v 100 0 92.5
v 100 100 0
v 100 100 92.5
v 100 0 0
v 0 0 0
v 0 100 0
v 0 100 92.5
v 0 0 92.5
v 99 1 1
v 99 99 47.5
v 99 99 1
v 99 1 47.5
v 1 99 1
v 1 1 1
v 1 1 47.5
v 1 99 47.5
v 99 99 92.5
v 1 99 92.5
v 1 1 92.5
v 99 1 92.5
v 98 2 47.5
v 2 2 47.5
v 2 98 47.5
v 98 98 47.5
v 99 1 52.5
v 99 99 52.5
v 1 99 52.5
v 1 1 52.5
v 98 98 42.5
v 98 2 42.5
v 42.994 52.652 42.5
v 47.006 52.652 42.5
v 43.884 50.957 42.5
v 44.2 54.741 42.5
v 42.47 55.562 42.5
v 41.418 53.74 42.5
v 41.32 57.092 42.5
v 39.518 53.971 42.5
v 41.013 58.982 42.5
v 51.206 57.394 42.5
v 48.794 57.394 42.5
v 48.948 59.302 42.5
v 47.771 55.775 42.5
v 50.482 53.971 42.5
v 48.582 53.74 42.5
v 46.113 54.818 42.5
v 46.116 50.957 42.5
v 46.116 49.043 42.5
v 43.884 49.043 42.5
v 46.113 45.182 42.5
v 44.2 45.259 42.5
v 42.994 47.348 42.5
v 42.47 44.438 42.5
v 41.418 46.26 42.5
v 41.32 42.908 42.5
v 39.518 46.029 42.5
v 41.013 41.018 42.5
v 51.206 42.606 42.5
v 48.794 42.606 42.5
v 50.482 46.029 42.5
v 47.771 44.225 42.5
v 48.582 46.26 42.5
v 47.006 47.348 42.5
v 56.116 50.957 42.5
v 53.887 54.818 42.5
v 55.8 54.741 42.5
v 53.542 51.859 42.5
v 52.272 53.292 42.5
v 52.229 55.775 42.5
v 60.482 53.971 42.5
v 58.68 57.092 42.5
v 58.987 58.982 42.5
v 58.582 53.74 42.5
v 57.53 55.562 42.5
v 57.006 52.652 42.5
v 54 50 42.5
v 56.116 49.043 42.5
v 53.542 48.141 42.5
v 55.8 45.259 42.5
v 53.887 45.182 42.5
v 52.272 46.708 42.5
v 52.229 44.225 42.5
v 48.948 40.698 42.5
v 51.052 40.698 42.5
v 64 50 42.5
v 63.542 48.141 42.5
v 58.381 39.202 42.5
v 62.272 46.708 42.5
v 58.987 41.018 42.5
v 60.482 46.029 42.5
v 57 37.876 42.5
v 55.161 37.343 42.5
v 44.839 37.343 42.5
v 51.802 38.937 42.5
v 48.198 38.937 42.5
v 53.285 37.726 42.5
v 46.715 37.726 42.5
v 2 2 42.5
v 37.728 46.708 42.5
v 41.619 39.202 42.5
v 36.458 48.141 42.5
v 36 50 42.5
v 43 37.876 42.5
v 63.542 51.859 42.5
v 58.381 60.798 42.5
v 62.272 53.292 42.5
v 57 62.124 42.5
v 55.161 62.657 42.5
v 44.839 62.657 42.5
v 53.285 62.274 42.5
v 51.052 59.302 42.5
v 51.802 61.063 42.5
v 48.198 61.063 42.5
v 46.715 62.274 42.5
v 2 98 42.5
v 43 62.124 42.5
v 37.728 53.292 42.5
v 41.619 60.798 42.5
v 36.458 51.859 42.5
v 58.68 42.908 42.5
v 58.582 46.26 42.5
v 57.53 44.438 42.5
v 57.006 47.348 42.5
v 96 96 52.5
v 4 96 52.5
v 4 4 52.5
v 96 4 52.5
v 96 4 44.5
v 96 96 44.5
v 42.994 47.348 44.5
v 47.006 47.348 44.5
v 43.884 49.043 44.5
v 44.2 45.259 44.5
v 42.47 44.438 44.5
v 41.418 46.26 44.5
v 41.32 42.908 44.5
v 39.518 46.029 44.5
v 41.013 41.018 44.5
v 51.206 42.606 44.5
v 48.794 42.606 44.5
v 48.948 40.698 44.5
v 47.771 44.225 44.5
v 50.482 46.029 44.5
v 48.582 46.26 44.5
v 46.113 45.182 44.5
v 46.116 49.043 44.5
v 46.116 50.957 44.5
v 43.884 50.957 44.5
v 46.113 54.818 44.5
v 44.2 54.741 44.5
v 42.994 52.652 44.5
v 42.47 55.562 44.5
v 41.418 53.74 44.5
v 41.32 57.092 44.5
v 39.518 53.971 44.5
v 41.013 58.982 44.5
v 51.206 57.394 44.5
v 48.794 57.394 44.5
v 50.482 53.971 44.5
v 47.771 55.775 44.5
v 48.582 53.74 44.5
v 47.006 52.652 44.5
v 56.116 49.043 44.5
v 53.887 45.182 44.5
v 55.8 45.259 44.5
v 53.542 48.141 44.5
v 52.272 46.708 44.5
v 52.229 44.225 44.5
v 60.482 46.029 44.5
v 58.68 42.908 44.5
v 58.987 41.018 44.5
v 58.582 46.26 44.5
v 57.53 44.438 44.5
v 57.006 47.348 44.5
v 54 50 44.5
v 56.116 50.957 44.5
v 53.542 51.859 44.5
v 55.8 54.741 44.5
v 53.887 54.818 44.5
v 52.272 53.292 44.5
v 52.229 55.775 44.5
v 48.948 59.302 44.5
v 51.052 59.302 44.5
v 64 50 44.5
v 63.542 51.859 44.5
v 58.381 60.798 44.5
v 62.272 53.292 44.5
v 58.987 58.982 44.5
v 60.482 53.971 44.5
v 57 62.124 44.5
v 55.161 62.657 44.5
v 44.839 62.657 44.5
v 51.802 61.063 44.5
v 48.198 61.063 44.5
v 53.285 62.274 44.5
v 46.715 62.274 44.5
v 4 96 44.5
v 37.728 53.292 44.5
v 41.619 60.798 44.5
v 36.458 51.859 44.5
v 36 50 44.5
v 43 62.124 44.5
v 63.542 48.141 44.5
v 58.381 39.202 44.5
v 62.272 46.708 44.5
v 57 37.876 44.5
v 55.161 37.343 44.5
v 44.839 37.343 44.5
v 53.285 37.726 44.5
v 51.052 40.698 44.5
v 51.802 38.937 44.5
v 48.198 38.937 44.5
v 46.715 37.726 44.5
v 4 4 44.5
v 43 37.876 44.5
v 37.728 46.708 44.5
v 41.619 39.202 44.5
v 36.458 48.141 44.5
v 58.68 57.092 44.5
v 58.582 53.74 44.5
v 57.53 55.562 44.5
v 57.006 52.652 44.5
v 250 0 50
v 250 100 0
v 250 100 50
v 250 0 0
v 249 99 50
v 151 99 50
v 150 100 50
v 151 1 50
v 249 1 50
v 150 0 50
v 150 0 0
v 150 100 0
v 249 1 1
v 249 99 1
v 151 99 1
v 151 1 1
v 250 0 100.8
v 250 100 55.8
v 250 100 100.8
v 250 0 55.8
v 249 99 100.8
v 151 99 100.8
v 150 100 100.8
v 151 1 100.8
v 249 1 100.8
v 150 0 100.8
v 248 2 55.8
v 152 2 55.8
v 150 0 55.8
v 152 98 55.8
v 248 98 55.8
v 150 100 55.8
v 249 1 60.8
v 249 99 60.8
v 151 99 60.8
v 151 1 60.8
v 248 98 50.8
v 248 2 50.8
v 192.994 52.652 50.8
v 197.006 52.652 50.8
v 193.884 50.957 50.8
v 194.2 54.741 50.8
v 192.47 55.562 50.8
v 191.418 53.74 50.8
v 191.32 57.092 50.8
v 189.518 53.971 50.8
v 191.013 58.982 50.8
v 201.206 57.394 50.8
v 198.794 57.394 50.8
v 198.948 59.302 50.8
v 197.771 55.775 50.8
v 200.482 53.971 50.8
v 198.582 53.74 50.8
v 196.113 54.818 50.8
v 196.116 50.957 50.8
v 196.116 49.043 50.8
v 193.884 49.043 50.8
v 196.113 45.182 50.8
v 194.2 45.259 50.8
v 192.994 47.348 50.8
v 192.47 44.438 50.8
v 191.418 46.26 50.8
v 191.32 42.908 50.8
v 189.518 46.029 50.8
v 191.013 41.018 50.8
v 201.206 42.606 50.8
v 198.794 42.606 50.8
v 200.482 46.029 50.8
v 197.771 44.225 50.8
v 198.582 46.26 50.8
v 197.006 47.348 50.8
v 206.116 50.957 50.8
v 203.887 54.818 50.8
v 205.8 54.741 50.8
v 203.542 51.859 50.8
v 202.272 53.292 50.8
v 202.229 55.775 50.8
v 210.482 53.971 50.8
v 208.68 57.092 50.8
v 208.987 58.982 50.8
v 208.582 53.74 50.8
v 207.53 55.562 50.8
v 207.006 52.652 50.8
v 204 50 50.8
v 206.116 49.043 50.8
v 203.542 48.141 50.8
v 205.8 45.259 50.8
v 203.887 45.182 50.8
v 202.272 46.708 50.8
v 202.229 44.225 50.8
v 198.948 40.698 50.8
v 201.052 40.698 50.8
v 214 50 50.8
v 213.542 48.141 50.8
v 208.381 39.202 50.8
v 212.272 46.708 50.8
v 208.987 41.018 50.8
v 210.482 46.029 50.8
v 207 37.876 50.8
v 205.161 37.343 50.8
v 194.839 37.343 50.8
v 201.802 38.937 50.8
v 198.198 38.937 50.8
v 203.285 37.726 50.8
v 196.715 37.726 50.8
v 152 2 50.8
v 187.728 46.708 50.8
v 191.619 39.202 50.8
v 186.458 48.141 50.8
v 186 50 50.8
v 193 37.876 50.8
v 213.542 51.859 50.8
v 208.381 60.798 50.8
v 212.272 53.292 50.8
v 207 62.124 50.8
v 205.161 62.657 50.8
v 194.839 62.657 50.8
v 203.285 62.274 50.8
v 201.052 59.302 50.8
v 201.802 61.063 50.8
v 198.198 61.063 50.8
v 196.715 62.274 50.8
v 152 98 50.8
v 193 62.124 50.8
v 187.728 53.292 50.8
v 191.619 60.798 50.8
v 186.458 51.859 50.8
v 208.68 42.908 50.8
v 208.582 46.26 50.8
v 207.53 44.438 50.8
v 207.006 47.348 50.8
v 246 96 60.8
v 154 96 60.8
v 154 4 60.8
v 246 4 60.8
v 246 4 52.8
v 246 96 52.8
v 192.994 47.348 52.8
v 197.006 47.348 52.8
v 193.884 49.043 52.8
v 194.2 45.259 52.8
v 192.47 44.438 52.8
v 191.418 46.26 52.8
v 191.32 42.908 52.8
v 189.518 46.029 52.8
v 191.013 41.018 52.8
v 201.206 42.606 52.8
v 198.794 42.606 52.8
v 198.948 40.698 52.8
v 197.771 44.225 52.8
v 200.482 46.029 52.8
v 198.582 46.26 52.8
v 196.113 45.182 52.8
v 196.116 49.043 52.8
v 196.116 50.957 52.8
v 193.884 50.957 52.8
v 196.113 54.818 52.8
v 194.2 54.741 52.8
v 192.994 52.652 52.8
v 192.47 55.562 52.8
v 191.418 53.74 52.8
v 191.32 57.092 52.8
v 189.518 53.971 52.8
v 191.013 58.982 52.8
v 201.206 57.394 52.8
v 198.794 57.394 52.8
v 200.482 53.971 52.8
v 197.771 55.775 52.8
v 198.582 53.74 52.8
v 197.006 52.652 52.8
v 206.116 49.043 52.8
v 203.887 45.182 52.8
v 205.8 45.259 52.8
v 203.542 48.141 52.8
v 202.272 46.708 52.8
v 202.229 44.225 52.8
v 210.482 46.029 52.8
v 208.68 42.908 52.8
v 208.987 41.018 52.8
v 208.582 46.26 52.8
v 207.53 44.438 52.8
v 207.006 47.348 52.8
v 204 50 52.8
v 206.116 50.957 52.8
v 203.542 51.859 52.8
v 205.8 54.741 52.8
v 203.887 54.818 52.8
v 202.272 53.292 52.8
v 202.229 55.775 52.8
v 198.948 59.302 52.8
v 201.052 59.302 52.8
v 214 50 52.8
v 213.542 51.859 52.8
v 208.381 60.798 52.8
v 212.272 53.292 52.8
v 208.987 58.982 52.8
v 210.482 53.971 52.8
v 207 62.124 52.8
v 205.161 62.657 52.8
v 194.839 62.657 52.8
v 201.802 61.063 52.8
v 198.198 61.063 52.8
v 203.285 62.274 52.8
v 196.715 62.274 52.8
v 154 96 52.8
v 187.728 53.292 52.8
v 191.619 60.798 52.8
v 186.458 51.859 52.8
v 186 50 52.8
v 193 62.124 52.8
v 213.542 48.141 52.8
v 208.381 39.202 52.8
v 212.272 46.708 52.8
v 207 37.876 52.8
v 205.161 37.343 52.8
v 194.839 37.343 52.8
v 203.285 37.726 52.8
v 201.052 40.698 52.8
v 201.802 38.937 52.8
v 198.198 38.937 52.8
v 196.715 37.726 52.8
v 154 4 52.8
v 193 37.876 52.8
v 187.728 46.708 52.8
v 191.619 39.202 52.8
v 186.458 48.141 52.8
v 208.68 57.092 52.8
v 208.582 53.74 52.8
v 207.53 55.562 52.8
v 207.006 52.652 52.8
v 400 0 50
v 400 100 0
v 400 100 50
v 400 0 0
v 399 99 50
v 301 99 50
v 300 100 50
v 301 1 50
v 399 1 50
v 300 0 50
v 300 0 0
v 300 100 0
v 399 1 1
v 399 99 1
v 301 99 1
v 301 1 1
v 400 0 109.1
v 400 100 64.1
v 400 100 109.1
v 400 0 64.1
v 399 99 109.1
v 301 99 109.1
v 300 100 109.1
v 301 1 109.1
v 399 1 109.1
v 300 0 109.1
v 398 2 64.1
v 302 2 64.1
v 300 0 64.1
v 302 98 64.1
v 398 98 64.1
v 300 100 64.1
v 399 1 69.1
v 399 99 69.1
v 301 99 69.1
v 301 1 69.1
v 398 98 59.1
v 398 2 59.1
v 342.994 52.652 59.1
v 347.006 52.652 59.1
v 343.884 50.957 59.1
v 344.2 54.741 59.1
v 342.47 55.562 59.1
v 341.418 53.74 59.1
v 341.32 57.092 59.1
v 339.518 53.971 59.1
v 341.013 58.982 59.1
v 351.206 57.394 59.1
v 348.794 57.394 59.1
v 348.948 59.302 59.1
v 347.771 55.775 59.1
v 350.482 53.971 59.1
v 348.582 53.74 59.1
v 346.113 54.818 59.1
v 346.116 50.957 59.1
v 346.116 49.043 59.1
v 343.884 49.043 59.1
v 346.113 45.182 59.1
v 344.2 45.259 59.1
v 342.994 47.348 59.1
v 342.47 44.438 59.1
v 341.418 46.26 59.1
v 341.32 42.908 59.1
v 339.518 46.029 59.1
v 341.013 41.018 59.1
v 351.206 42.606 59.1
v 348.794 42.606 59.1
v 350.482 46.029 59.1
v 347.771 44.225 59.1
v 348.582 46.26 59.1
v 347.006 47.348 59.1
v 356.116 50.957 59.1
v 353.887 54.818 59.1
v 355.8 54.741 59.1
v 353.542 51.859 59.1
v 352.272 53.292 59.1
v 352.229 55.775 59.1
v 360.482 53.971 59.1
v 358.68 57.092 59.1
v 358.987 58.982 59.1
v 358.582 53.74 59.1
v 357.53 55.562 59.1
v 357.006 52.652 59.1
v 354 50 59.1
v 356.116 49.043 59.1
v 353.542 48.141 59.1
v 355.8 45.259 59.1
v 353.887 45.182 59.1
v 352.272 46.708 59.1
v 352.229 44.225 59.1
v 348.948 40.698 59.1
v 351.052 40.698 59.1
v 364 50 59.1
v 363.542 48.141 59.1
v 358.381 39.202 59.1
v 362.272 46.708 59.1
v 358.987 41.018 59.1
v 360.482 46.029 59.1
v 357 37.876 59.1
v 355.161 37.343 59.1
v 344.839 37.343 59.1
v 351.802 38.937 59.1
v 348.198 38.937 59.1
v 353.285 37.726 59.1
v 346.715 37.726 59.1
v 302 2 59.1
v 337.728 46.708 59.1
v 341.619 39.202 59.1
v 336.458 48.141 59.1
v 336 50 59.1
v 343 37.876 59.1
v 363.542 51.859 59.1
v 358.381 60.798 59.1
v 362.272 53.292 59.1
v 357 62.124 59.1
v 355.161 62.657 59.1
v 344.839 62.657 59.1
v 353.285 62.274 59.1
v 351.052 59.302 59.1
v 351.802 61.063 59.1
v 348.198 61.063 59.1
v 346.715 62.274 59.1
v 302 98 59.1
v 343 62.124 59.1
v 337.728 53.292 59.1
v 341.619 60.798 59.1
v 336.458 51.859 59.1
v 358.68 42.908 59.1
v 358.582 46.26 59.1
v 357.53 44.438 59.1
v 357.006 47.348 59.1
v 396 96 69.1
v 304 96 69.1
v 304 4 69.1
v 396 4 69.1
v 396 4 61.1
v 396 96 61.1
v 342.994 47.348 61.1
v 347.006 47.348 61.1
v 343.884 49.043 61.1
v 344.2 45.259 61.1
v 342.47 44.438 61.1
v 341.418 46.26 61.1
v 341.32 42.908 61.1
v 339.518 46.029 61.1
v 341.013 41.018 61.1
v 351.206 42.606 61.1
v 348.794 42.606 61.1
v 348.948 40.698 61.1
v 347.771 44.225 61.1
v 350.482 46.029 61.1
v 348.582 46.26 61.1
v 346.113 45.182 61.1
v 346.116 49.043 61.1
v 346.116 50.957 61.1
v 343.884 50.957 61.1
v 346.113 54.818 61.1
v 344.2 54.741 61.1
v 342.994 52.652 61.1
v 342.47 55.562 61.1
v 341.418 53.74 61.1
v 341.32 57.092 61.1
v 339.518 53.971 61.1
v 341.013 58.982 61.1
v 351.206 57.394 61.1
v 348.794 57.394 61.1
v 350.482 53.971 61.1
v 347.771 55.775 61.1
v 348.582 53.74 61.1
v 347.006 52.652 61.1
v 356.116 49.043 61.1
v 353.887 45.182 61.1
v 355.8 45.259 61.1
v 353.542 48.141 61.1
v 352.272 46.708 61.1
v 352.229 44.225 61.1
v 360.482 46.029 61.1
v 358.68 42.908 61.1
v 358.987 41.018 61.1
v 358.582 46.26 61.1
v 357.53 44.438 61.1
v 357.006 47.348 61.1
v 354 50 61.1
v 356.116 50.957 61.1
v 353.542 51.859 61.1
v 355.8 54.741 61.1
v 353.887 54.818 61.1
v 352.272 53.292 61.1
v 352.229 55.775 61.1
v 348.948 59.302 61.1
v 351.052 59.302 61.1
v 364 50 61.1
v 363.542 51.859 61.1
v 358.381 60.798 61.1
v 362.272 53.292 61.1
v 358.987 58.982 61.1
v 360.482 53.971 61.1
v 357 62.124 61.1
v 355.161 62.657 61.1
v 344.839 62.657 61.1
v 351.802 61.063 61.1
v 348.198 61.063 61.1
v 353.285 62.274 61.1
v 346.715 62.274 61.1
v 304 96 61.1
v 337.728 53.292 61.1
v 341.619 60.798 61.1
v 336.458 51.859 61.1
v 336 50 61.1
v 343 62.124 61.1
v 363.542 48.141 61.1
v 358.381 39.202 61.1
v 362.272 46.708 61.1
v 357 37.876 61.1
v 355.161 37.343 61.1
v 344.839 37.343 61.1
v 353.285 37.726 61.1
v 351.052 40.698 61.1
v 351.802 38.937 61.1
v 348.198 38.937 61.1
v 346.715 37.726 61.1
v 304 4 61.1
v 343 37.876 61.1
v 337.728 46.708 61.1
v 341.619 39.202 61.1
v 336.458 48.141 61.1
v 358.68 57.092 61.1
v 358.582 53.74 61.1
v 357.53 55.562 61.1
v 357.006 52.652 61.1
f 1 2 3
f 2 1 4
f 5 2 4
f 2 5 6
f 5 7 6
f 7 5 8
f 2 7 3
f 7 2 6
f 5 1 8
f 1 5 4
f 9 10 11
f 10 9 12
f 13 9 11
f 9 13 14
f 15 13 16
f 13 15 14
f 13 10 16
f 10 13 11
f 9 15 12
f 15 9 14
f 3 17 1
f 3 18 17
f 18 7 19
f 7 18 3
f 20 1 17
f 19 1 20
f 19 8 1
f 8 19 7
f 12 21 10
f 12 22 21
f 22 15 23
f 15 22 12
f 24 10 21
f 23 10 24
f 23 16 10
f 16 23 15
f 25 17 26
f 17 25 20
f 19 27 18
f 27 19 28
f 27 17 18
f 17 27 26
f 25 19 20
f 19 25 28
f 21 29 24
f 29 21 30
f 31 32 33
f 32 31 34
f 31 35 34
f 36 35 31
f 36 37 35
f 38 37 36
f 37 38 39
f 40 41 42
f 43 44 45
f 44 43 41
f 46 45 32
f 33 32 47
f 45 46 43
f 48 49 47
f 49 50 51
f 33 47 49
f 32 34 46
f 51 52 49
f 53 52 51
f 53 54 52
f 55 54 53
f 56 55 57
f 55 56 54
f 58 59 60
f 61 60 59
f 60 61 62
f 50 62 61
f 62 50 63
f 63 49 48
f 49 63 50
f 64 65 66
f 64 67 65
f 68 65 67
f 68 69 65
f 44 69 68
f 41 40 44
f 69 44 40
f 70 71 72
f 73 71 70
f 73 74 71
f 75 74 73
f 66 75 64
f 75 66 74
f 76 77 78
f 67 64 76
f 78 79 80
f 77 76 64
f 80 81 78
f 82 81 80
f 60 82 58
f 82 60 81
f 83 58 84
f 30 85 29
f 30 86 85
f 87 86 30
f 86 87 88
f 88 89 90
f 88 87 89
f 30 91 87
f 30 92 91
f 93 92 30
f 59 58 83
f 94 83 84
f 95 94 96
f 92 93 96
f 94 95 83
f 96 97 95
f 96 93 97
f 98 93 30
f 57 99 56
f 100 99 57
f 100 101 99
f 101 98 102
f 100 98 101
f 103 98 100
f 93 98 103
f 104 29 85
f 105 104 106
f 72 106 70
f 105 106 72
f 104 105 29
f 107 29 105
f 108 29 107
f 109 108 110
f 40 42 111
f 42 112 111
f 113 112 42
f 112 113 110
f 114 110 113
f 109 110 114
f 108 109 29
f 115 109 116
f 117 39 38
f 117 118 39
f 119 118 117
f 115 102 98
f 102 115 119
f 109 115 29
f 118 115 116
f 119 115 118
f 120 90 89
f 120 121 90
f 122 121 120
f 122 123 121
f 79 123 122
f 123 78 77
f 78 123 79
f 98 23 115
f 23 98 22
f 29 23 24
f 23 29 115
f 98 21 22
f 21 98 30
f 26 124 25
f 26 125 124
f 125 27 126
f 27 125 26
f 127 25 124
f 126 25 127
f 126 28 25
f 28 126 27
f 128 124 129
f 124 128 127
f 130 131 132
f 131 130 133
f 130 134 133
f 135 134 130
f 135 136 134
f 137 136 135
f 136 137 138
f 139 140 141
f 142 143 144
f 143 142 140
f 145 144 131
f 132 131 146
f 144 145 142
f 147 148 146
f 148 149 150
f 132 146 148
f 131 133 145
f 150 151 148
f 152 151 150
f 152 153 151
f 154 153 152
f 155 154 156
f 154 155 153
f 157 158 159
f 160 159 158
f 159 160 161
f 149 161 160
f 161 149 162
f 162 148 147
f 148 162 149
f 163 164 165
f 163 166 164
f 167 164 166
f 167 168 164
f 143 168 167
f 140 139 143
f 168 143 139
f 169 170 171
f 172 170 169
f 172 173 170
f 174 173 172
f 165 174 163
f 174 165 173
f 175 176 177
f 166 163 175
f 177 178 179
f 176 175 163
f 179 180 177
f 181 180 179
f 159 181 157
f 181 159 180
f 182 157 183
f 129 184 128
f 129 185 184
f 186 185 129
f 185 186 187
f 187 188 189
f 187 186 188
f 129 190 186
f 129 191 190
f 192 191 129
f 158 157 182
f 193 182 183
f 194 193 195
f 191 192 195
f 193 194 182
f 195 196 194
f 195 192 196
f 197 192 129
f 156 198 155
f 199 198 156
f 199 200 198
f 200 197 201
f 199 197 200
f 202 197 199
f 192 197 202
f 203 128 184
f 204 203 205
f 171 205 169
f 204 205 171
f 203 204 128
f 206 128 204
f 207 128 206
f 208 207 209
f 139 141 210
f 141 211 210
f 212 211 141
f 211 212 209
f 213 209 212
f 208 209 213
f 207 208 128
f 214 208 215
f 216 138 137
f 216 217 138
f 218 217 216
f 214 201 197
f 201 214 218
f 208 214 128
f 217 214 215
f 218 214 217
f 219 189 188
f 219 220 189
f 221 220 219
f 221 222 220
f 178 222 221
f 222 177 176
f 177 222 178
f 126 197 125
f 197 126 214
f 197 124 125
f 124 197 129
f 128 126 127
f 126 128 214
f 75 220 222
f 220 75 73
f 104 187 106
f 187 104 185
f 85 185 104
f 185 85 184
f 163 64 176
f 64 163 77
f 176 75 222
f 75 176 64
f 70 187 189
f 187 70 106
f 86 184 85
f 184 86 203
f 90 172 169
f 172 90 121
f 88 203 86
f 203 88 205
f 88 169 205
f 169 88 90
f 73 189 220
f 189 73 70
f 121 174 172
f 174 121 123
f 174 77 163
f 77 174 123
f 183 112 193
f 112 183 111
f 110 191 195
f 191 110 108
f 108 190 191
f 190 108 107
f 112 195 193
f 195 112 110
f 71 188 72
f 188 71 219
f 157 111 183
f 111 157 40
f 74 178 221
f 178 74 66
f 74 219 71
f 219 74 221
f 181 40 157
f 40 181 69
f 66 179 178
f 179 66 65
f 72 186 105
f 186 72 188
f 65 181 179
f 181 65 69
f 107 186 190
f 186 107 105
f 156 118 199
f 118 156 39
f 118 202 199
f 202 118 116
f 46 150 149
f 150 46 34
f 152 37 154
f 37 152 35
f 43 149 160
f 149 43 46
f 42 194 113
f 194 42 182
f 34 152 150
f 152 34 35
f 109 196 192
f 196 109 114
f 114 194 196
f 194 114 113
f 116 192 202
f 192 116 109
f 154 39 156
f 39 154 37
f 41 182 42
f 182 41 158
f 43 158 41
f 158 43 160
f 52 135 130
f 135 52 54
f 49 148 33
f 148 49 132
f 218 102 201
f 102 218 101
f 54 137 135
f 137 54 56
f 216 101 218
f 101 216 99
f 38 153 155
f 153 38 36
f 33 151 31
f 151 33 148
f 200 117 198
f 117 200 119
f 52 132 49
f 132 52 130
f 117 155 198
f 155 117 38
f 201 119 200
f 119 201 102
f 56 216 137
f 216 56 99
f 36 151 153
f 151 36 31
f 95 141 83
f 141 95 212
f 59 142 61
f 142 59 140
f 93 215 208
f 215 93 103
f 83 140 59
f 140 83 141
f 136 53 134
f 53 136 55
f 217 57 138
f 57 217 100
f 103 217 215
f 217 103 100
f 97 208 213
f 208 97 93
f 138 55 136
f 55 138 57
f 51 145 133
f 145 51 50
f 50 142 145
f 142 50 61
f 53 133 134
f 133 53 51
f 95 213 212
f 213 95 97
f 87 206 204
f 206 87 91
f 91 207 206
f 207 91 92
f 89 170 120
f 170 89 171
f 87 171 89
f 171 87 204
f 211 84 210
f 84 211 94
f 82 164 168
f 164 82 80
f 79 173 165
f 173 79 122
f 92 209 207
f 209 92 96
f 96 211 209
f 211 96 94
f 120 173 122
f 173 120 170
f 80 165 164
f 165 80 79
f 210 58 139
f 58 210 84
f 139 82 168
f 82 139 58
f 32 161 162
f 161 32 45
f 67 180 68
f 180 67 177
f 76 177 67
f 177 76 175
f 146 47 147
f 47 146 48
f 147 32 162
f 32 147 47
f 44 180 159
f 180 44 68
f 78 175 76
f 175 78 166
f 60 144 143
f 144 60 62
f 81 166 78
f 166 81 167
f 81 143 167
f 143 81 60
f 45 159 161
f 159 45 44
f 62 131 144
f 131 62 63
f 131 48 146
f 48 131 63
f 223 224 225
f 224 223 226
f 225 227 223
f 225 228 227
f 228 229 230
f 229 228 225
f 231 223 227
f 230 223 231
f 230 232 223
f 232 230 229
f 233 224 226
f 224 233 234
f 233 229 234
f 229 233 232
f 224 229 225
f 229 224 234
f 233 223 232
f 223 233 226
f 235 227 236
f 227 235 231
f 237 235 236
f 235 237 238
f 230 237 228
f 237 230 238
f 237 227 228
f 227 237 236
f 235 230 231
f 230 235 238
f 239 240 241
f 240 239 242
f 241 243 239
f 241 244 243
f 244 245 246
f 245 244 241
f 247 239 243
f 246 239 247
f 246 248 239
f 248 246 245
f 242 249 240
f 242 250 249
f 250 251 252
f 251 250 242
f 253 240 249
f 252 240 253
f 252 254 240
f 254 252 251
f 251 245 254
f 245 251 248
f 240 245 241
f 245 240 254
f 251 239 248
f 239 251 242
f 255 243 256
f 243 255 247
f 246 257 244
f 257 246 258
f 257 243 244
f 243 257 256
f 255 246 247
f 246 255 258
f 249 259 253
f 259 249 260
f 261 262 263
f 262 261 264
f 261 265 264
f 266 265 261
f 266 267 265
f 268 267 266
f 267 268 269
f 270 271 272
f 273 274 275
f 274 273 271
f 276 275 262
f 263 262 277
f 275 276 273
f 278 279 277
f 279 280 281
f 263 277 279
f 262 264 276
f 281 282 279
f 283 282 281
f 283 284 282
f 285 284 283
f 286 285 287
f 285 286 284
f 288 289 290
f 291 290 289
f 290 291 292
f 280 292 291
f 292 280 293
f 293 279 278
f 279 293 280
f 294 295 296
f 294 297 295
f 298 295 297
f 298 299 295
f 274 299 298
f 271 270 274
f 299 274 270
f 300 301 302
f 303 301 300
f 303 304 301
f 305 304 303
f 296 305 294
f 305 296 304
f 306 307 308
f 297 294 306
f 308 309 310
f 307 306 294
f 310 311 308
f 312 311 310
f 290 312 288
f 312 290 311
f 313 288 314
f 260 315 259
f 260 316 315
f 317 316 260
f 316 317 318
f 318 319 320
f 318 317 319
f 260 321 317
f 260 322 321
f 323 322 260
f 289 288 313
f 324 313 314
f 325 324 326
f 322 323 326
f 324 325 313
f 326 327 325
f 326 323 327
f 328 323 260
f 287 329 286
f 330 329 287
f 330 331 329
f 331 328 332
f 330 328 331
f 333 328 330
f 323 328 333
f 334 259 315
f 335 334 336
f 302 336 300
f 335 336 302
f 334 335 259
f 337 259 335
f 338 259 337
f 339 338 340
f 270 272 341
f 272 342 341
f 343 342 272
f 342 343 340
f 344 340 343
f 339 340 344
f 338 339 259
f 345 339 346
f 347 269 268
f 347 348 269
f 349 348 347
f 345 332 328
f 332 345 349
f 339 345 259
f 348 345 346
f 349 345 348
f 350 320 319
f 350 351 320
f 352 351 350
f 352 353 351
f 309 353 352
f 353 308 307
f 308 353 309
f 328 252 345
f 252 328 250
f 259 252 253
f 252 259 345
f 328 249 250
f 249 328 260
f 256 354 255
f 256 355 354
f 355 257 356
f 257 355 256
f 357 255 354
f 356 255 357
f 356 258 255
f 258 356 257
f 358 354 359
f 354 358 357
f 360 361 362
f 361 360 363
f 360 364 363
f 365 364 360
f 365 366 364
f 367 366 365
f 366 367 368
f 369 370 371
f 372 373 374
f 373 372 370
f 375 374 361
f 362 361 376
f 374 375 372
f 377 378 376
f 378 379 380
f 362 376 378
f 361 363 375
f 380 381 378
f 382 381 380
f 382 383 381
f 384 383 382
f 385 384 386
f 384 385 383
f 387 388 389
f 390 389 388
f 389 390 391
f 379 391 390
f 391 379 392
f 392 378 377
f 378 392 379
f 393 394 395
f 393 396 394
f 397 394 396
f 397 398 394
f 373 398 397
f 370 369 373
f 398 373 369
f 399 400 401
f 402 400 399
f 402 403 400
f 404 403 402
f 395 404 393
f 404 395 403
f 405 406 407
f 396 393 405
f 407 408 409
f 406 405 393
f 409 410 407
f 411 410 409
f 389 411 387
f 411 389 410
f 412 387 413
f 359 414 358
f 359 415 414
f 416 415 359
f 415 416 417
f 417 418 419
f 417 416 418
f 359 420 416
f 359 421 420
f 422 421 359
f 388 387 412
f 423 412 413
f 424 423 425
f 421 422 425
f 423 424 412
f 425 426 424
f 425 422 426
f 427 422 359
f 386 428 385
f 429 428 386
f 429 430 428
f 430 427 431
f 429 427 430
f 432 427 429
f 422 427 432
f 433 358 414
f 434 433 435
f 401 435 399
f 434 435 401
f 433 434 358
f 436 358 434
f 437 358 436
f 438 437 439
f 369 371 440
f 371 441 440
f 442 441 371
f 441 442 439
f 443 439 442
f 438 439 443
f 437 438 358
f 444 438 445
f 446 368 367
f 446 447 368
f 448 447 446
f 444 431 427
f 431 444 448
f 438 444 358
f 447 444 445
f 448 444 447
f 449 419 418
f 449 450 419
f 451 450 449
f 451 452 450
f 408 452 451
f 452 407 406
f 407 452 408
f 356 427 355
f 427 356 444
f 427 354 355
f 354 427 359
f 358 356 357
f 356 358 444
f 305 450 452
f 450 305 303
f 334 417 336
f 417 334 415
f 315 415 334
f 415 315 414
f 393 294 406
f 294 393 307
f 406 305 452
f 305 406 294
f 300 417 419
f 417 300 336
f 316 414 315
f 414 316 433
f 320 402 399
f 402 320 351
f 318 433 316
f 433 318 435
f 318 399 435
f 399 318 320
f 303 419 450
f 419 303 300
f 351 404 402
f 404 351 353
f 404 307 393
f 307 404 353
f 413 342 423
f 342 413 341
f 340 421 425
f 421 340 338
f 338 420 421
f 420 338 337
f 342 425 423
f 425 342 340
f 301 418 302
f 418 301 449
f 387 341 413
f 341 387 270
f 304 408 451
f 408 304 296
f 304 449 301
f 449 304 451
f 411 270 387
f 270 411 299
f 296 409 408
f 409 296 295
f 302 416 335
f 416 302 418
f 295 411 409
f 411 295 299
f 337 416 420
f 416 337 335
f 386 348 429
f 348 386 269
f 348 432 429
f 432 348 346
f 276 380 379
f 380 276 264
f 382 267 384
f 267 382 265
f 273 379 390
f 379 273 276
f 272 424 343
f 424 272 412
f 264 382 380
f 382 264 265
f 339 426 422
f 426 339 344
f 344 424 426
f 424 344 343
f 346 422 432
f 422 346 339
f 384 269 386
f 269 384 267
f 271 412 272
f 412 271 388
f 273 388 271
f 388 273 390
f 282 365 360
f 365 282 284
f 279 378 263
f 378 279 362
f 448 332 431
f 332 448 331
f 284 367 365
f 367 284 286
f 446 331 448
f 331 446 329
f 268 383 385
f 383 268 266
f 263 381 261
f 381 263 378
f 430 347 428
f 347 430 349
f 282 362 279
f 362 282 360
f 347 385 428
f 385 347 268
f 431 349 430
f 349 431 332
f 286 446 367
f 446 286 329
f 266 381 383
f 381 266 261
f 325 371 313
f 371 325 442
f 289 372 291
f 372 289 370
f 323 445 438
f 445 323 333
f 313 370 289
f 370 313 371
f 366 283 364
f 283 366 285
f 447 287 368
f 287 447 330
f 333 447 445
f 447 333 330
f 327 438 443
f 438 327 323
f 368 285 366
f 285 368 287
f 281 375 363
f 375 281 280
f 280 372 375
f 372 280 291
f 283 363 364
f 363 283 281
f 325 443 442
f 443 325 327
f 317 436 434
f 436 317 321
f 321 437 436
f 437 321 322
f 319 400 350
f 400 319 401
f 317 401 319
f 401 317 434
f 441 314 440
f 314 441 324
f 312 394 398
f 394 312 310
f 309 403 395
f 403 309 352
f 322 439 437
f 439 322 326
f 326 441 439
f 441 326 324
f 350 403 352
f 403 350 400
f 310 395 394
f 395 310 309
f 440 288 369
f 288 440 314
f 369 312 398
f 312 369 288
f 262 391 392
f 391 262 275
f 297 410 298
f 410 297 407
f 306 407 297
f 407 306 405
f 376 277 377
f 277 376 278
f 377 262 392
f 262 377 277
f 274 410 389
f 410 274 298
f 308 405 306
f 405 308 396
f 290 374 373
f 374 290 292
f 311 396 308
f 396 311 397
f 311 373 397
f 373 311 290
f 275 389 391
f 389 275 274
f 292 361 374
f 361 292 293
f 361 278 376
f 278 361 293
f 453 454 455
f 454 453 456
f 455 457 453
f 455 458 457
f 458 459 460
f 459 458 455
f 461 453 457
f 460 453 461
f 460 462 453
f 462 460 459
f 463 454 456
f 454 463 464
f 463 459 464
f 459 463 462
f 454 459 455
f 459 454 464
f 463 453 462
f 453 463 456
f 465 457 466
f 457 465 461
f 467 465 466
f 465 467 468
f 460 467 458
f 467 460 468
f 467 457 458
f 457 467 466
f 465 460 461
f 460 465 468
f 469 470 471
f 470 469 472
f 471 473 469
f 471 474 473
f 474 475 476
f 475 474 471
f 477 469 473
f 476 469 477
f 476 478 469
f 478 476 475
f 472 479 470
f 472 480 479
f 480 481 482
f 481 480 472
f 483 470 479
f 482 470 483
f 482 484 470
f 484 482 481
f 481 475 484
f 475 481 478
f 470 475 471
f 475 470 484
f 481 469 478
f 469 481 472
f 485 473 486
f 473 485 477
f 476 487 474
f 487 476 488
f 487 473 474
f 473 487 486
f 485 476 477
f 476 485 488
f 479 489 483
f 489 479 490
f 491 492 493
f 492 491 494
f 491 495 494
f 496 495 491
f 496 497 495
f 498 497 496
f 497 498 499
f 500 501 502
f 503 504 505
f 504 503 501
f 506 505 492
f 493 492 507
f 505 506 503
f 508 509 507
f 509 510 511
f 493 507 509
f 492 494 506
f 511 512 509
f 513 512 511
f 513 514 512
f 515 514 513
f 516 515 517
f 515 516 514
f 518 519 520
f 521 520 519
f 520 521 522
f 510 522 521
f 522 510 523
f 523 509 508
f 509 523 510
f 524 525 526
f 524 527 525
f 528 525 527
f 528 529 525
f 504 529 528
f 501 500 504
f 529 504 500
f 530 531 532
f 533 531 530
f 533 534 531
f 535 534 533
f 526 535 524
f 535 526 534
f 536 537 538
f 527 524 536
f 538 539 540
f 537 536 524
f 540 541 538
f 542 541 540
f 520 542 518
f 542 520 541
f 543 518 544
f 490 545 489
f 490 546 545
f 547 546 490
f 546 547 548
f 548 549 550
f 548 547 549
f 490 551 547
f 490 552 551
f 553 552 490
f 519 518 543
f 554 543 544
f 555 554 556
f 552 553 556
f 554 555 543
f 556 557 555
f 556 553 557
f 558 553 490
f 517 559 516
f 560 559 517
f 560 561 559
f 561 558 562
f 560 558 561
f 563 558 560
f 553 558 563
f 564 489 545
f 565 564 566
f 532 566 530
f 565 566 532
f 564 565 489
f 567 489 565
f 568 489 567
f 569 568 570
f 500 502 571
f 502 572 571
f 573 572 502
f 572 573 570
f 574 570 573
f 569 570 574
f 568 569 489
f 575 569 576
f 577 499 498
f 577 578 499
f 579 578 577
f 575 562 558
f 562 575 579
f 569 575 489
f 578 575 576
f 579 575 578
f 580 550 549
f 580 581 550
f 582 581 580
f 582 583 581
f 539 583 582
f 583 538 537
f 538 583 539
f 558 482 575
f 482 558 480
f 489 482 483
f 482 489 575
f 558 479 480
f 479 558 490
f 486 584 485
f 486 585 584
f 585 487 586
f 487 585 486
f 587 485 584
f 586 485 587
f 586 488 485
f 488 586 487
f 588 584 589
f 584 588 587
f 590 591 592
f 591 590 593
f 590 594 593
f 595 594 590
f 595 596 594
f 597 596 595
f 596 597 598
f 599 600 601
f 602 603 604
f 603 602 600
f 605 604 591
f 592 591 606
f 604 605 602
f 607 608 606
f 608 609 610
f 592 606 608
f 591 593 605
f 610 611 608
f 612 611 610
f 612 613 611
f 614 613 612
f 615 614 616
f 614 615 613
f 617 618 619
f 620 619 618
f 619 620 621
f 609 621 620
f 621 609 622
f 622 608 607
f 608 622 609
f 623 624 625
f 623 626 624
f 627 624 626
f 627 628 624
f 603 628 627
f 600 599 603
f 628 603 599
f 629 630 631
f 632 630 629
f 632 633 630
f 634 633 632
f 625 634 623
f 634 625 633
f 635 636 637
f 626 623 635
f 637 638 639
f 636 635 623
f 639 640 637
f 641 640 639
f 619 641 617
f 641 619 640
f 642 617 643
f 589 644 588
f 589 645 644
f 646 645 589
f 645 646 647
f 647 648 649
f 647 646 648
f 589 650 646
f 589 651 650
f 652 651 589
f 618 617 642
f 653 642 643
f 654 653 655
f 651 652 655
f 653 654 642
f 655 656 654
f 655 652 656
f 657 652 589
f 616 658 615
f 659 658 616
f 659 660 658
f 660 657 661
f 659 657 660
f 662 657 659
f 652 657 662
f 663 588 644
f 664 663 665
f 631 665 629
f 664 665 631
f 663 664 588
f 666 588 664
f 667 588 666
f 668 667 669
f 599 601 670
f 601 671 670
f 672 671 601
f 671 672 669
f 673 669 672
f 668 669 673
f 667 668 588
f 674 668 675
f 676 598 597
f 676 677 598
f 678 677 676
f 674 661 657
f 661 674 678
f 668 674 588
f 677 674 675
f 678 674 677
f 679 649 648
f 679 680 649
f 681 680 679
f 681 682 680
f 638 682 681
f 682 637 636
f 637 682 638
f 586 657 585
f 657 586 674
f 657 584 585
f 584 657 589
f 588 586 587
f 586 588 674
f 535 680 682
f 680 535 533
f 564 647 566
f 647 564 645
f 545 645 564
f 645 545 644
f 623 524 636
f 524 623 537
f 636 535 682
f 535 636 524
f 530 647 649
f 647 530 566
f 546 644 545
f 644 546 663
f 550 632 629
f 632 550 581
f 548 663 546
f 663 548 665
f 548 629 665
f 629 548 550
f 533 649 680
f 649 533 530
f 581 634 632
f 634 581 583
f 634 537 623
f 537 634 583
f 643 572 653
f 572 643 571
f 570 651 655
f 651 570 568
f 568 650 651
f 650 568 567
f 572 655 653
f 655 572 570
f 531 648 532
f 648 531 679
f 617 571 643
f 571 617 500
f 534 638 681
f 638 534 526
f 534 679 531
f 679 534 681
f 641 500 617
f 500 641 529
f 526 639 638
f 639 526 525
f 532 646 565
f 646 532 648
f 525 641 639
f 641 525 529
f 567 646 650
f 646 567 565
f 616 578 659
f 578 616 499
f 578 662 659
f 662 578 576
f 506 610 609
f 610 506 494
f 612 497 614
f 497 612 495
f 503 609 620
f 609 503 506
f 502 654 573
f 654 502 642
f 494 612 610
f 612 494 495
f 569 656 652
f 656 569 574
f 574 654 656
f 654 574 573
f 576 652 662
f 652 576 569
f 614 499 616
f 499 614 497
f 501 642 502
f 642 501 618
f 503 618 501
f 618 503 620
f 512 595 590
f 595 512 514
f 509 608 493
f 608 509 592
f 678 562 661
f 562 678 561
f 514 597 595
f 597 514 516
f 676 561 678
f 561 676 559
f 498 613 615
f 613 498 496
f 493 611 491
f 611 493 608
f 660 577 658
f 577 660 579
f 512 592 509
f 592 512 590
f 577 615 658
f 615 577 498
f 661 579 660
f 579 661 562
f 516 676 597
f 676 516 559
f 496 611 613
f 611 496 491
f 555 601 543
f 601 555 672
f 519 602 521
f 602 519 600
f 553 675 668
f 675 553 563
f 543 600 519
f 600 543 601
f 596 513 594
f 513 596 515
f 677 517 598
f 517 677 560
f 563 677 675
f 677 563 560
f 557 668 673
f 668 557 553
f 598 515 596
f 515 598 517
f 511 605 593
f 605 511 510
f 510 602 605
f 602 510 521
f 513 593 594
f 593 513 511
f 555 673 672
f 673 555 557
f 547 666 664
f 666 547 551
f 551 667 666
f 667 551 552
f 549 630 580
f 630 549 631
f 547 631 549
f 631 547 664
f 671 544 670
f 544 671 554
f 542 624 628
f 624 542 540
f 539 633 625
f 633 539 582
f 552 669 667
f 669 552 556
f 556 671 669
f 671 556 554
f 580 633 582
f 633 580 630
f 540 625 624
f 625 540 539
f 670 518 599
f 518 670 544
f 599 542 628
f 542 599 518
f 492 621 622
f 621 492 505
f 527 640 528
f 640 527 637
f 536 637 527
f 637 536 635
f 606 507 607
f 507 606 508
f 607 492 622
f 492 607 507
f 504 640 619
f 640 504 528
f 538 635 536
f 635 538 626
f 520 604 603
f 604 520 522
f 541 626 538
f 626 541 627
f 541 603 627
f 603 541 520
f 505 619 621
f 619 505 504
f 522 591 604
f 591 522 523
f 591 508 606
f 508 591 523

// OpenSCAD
// Square hydro-wicked planter.
// Size customizable via below parameters

// << Parameters >>

$width = 100;
$depth = 100;
$height = 50;

$margin = 2;

$connection = 5;

$hole_dia = 4;

$show_present = true;
$show_print_basin = false;
$show_print_planter = false;

// << Modules >>

module basin() {
  color("cyan") difference() {
    cube(size = [ $width, $depth, $height ], center = true);

    // DIFF
    translate([ 0, 0, $margin ])
        cube(size = [ $width - $margin, $depth - $margin, $height + $margin ],
             center = true);
  }
}

module planter() {
  difference() {
    difference() {
      union() {
        // Top part of planter
        color("lime") difference() {
          cube(size = [ $width, $depth, $height - $connection ], center = true);

          // DIFF
          translate([ 0, 0, $margin ]) cube(
              size = [ $width - $margin, $depth - $margin, $height + $margin ],
              center = true);
        }

        // Bottom connector
        color("tomato") translate([ 0, 0, -($height / 2) ]) {
          union() {
            // Connector part
            cube(
                size =
                    [ $width - $margin * 2, $depth - $margin * 2, $connection ],
                center = true);

            // Connecting bit to outer shell
            translate([ 0, 0, $connection ])
                cube(size = [ $width, $depth, $connection ], center = true);
          }
        }
      }
      // DIFF
      translate([ 0, 0, -$height / 2 + $margin * 2 ])
          cube(size =
                   [
                     $width - $margin * 4, $depth - $margin * 4,
                     $connection + $margin * 2
                   ],
               center = true);
    }

    // Drainage holes
    translate([ 0, 0, -$height ]) cylinder($height, $hole_dia, $hole_dia);
    for (i = [0:5]) {
      rotate([ 0, 0, 360 / 6 * i ])
          translate([ $hole_dia * 2 + $margin, 0, -$height ])
              cylinder($height, $hole_dia, $hole_dia);
    }
  }
}

// << Presenting >>

module present($gap) {
  translate([ $width / 2, $depth / 2, $height / 2 ]) basin();
  translate(
      [ $width / 2, $depth / 2, $height / 2 + $height - $connection + $gap ])
      planter();
}

if ($show_present) {
  for (i = [0:2]) {
    translate([ ($width + $width / 2) * i, 0, 0 ]) present(8.3 * i);
  }
}

if ($show_print_basin) {
  basin();
}

if ($show_print_planter) {
  planter();
}
